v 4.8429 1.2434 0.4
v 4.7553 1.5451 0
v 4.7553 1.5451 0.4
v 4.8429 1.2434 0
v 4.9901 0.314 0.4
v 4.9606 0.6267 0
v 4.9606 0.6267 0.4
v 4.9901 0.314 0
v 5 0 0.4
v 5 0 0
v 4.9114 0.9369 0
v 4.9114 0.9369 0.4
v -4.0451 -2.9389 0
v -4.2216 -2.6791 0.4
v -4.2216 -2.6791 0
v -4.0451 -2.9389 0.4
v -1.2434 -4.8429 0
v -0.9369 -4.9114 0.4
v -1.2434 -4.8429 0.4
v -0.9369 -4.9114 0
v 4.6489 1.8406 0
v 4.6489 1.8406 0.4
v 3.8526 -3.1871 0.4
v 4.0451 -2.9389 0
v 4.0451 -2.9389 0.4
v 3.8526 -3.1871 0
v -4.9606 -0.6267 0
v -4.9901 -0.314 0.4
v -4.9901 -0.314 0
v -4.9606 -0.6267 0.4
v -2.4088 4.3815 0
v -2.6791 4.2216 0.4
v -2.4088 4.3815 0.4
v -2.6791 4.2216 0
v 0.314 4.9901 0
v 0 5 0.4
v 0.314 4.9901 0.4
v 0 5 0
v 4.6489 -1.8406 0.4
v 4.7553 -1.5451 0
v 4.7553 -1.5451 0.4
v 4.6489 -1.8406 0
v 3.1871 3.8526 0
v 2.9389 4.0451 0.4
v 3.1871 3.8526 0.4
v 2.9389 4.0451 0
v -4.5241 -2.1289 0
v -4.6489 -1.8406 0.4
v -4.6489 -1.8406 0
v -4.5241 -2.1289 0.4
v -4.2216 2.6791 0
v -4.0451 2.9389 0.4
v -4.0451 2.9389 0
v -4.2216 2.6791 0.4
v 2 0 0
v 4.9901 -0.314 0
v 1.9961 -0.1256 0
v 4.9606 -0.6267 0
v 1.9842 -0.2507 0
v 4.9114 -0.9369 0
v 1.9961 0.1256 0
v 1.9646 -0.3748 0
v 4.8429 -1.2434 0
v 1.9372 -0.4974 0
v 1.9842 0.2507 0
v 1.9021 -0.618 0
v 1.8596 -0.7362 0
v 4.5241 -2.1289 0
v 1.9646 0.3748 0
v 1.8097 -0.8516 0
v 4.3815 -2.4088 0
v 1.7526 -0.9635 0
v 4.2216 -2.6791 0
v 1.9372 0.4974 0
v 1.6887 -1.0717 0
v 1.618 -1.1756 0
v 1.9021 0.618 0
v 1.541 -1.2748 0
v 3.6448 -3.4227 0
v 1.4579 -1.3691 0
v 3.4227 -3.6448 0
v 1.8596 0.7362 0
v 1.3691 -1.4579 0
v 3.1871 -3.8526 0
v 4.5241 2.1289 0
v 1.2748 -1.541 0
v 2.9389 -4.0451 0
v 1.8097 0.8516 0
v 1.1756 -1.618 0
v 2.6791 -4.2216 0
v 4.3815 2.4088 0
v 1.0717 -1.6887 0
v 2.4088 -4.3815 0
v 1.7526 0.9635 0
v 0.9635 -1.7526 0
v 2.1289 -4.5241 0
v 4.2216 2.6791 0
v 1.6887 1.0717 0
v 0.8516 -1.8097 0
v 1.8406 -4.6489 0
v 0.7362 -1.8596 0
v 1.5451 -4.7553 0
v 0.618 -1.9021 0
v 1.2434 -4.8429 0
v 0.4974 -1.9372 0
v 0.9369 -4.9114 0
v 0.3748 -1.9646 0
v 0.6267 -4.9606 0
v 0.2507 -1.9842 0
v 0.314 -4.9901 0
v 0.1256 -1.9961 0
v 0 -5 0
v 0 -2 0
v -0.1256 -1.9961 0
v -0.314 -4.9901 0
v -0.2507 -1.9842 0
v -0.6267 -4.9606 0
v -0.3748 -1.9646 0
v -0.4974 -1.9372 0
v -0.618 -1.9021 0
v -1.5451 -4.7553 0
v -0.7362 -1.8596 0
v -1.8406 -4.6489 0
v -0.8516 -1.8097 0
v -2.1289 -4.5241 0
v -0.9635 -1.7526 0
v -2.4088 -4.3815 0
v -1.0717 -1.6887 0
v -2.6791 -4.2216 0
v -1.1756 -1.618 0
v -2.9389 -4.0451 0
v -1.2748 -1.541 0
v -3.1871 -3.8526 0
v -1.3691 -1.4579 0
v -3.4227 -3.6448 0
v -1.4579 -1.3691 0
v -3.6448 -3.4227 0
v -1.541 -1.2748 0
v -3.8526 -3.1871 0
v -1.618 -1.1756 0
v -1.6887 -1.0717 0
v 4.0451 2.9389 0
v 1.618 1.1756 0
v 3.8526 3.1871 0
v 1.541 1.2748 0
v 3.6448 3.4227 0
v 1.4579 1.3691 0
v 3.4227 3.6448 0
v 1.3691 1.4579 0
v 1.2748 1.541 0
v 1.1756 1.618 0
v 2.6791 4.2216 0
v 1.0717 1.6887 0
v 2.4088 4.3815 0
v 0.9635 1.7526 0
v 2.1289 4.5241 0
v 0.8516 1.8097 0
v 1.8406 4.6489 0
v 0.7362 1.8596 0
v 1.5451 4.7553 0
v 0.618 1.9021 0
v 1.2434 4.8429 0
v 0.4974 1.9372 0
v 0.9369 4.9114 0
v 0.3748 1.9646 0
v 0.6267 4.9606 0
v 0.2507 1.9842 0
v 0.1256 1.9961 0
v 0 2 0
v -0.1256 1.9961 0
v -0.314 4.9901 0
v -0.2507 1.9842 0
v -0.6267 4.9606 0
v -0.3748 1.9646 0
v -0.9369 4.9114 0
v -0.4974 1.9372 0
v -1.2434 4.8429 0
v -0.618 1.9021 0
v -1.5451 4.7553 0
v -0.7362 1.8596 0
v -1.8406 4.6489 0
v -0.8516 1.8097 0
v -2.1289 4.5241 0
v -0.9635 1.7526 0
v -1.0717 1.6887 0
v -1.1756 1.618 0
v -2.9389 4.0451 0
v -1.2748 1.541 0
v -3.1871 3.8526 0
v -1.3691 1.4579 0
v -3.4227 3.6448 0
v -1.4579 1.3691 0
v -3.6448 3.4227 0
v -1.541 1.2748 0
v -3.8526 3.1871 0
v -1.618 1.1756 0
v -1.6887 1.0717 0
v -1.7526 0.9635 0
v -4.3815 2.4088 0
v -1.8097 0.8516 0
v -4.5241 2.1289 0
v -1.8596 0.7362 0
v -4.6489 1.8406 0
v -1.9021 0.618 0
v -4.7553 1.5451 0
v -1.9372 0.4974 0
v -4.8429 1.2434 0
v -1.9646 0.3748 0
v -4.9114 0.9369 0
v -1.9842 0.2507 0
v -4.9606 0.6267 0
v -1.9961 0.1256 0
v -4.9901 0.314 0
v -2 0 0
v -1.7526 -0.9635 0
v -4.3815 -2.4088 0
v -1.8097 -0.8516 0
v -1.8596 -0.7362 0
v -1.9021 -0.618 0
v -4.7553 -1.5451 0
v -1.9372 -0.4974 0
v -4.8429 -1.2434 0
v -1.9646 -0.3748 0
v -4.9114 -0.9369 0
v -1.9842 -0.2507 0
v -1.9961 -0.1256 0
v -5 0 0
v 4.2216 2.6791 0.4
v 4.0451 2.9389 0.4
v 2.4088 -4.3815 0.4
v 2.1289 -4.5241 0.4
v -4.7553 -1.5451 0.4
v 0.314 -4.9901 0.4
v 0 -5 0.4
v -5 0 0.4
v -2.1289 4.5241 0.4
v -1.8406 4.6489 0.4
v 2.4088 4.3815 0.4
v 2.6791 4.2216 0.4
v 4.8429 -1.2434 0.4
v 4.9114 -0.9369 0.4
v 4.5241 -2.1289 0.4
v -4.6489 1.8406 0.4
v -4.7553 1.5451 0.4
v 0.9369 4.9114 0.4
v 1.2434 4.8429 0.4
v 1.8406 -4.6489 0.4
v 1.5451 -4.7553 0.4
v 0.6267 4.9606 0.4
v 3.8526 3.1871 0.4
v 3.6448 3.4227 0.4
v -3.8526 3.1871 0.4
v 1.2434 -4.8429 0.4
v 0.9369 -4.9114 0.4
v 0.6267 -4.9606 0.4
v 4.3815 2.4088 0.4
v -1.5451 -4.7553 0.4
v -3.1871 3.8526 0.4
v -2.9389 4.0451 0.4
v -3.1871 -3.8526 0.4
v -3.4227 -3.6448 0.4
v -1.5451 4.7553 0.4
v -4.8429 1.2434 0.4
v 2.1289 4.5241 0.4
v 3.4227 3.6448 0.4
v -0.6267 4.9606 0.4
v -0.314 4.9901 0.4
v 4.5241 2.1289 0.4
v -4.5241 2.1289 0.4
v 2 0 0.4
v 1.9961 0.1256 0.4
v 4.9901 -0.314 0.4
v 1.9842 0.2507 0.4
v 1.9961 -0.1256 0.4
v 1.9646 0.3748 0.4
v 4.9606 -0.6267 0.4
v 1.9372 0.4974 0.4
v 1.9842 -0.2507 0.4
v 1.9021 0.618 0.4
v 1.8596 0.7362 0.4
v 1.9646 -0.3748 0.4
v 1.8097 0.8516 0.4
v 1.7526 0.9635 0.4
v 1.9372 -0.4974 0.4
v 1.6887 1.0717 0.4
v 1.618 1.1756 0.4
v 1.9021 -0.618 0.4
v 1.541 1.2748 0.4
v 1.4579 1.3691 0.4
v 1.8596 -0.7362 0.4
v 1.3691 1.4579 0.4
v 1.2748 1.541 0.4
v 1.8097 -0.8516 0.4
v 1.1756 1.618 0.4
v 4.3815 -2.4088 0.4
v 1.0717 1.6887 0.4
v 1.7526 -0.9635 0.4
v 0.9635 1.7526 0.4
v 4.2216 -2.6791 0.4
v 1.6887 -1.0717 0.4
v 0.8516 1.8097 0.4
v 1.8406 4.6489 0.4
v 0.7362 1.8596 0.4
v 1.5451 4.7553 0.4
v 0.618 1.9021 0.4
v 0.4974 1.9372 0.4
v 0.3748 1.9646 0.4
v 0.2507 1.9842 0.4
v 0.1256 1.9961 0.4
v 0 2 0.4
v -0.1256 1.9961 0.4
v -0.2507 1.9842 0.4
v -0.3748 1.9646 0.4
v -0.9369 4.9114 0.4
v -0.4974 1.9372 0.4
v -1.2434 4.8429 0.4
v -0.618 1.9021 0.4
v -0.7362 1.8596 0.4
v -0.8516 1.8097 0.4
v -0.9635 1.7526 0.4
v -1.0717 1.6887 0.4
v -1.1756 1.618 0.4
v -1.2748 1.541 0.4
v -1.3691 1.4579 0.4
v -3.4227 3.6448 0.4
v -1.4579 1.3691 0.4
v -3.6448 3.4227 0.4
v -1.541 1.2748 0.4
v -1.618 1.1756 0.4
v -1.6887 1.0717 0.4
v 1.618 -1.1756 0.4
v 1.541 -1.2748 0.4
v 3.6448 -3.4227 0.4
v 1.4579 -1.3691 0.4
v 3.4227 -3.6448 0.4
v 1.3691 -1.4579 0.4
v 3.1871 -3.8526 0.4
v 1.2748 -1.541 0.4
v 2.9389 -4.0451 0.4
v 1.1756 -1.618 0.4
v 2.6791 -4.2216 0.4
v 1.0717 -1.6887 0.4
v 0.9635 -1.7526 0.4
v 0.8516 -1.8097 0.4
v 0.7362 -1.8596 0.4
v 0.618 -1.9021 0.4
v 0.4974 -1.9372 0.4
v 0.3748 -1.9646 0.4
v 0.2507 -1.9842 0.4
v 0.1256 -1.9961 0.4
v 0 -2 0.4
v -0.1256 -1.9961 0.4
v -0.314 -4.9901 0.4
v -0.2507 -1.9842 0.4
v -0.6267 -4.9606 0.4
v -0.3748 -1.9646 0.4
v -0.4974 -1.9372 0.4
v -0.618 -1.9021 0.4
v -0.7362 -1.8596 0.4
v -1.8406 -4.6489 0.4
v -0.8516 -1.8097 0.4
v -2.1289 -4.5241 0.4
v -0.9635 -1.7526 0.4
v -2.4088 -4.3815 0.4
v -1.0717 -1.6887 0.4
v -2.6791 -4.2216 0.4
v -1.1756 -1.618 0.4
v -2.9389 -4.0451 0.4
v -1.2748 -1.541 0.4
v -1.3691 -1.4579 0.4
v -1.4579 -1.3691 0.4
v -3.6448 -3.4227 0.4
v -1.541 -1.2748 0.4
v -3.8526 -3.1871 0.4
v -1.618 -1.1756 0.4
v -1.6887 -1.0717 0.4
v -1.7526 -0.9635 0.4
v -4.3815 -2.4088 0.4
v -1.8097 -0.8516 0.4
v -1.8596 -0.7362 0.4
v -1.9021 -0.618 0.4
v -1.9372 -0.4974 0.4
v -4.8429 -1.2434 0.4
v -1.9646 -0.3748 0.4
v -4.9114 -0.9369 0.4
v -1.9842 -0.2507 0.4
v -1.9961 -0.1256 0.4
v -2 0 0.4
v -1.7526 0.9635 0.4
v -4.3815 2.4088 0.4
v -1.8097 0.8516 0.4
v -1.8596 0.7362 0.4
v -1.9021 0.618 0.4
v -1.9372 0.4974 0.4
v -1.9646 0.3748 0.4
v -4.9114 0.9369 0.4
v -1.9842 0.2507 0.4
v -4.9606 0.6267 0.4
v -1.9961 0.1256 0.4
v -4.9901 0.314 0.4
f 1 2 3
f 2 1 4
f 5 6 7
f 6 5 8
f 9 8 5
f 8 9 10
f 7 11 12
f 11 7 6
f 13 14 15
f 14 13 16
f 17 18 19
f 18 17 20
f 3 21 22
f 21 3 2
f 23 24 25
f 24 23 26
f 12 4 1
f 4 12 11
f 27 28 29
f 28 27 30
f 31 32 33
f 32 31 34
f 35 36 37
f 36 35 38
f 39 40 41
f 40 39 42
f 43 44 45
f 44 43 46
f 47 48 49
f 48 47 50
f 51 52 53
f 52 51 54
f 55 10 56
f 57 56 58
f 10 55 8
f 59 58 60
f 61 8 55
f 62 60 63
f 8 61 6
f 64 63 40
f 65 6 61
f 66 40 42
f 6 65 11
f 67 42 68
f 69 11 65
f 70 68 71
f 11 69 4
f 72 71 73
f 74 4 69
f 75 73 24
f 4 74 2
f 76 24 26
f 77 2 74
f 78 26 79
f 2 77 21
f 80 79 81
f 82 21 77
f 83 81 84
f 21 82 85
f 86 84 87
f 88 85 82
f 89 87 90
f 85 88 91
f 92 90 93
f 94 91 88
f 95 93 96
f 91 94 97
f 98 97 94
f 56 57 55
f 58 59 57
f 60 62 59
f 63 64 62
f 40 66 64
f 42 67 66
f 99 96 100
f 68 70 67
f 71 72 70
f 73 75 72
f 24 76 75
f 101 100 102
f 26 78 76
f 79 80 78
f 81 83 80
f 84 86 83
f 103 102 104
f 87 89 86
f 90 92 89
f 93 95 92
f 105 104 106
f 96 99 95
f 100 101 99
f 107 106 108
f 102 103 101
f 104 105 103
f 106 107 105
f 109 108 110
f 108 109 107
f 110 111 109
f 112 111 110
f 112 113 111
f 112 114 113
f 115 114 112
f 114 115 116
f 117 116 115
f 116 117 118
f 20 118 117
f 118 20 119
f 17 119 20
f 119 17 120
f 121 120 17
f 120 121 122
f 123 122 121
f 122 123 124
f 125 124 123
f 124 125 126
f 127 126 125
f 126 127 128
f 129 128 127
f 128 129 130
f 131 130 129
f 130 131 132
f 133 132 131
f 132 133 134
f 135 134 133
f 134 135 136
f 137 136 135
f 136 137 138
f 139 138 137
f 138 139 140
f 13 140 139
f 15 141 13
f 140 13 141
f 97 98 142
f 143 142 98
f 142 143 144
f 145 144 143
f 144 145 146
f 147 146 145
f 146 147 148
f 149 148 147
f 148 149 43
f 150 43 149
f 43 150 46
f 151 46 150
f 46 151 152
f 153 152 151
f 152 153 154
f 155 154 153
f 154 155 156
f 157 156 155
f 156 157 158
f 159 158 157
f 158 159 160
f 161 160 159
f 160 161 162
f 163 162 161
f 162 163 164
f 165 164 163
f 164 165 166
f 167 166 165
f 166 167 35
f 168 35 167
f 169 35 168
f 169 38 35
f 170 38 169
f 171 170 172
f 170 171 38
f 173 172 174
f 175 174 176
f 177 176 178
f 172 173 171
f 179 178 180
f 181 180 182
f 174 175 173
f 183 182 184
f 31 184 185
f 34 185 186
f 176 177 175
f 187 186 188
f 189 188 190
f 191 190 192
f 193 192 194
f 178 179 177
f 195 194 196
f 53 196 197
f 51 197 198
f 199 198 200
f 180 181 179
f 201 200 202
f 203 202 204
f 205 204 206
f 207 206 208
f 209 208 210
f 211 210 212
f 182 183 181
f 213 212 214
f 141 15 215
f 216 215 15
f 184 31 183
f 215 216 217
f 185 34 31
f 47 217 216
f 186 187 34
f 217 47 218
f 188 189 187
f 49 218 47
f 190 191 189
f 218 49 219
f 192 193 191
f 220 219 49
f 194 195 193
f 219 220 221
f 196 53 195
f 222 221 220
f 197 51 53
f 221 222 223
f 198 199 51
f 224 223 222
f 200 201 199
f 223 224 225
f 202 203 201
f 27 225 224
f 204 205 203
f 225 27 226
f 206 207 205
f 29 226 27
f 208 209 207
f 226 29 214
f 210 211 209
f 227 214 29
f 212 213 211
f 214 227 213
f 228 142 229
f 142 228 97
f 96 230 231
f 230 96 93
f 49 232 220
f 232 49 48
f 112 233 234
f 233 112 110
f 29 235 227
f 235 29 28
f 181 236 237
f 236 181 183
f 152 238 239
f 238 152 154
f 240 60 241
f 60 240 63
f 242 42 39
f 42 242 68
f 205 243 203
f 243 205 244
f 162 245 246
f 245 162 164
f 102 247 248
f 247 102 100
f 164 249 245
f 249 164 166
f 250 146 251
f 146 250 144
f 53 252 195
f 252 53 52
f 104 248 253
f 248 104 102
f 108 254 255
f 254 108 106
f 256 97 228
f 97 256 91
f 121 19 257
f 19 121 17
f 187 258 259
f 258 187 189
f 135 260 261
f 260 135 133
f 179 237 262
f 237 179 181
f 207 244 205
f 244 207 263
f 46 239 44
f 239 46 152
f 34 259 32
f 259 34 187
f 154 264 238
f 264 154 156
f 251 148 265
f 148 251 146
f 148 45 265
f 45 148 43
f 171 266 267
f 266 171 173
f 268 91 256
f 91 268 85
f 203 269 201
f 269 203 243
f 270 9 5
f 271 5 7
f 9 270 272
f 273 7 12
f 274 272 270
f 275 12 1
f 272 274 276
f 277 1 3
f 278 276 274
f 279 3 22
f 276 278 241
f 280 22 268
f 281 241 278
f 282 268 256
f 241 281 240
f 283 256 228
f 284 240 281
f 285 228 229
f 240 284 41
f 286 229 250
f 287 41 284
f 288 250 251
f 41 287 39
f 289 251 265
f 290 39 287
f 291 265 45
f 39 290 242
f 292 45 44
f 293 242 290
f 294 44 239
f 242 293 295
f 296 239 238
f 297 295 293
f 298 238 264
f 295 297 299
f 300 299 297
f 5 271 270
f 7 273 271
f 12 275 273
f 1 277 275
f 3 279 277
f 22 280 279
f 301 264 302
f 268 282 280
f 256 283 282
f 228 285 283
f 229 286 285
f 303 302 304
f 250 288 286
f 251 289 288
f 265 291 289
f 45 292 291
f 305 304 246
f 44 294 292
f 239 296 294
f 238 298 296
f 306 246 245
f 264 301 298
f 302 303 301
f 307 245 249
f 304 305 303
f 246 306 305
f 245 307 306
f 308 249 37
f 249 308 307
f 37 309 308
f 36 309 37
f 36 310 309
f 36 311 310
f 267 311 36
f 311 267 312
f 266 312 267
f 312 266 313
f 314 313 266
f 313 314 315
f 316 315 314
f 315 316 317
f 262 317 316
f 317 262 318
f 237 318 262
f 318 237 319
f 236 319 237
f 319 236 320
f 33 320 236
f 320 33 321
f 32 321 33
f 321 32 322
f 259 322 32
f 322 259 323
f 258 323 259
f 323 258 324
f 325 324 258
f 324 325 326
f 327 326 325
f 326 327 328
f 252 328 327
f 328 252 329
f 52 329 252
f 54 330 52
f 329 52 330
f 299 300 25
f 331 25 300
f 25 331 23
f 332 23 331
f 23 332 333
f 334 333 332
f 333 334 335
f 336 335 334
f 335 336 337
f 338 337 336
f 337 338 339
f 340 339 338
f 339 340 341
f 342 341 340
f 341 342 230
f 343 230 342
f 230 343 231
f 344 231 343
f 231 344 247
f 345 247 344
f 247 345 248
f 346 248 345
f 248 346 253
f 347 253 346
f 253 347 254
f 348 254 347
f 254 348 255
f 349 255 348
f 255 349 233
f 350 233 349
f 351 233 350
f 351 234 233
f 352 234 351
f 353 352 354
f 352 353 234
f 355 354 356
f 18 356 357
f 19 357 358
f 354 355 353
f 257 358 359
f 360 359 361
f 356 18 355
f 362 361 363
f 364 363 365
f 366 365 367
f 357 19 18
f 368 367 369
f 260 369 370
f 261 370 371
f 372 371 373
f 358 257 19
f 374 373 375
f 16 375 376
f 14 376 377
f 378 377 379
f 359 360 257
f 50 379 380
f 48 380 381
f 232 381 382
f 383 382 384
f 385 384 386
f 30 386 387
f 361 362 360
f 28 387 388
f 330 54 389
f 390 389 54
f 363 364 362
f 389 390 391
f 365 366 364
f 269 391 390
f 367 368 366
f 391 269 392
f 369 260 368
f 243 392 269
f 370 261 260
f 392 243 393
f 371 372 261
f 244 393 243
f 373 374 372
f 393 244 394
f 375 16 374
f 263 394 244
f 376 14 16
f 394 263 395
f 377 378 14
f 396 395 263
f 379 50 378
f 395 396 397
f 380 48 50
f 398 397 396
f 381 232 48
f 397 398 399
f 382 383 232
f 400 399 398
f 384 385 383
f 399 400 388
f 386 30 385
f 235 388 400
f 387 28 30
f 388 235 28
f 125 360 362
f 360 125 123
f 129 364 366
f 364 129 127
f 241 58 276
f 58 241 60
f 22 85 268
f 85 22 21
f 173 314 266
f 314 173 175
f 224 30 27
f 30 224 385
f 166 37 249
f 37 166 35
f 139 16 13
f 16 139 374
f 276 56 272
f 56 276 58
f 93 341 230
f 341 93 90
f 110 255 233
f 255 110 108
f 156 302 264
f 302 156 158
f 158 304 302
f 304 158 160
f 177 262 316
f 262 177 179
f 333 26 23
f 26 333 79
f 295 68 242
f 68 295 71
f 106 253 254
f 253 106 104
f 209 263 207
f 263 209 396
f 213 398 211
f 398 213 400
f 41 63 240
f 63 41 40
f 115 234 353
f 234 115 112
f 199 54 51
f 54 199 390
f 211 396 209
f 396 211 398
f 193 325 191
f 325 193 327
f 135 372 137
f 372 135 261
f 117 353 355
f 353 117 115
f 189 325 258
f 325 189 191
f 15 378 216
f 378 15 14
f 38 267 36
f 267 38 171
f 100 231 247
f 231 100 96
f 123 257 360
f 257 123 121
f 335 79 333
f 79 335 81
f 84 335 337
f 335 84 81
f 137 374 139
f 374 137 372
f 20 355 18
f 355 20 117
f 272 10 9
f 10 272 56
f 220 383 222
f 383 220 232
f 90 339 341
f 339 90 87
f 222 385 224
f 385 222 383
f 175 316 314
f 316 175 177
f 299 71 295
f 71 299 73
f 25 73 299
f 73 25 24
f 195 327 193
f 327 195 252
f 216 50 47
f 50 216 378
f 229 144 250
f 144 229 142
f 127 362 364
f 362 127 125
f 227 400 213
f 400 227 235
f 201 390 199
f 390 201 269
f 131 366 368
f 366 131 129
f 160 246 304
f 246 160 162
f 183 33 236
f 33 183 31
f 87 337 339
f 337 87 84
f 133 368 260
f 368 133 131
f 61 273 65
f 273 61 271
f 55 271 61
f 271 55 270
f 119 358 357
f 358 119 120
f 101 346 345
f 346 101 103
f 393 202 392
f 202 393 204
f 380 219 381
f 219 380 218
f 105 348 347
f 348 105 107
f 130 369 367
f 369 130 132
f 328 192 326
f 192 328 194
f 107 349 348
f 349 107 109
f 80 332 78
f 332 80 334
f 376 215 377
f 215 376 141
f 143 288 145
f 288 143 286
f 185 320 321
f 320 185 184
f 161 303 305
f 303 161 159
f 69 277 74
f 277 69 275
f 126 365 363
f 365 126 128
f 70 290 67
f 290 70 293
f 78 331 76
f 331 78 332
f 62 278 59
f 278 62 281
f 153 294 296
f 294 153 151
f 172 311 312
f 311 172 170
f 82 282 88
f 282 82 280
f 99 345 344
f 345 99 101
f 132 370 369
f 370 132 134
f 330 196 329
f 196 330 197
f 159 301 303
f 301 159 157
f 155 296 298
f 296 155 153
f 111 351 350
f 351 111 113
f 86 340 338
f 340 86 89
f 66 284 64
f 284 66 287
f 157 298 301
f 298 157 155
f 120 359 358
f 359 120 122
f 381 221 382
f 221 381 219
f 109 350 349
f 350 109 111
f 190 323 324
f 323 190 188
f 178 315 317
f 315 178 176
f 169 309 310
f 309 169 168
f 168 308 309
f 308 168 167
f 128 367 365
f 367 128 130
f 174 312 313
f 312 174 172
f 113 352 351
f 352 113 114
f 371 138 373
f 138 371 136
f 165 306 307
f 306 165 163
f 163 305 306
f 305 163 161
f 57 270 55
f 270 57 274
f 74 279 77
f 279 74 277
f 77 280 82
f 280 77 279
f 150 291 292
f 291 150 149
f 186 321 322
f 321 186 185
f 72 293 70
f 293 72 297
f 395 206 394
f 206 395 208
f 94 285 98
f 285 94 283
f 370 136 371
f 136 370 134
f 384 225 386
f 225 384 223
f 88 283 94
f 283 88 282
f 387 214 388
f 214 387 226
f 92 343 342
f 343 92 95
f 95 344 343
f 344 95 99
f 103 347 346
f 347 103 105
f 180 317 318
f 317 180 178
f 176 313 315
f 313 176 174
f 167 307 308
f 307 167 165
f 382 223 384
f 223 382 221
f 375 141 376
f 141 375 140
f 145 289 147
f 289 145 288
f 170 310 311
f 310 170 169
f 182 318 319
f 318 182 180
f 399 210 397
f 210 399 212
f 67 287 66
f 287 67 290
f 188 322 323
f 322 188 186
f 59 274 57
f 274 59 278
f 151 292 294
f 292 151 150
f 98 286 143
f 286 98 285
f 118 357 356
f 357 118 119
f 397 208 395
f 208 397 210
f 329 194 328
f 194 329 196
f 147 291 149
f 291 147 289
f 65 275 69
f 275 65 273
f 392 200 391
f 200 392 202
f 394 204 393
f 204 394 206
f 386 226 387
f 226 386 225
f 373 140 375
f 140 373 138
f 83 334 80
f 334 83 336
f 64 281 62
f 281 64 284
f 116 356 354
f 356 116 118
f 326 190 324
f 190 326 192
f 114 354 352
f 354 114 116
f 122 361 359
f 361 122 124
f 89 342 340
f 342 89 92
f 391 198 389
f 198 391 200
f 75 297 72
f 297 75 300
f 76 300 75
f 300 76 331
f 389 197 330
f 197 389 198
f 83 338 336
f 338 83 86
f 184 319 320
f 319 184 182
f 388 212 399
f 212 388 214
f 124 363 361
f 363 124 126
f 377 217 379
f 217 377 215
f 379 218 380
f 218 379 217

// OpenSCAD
difference(){
    cylinder(0.4, 5, 5, $fn=100);
    translate([0,0,-1])
    cylinder(2.4, 2, 2, $fn=100);
}
